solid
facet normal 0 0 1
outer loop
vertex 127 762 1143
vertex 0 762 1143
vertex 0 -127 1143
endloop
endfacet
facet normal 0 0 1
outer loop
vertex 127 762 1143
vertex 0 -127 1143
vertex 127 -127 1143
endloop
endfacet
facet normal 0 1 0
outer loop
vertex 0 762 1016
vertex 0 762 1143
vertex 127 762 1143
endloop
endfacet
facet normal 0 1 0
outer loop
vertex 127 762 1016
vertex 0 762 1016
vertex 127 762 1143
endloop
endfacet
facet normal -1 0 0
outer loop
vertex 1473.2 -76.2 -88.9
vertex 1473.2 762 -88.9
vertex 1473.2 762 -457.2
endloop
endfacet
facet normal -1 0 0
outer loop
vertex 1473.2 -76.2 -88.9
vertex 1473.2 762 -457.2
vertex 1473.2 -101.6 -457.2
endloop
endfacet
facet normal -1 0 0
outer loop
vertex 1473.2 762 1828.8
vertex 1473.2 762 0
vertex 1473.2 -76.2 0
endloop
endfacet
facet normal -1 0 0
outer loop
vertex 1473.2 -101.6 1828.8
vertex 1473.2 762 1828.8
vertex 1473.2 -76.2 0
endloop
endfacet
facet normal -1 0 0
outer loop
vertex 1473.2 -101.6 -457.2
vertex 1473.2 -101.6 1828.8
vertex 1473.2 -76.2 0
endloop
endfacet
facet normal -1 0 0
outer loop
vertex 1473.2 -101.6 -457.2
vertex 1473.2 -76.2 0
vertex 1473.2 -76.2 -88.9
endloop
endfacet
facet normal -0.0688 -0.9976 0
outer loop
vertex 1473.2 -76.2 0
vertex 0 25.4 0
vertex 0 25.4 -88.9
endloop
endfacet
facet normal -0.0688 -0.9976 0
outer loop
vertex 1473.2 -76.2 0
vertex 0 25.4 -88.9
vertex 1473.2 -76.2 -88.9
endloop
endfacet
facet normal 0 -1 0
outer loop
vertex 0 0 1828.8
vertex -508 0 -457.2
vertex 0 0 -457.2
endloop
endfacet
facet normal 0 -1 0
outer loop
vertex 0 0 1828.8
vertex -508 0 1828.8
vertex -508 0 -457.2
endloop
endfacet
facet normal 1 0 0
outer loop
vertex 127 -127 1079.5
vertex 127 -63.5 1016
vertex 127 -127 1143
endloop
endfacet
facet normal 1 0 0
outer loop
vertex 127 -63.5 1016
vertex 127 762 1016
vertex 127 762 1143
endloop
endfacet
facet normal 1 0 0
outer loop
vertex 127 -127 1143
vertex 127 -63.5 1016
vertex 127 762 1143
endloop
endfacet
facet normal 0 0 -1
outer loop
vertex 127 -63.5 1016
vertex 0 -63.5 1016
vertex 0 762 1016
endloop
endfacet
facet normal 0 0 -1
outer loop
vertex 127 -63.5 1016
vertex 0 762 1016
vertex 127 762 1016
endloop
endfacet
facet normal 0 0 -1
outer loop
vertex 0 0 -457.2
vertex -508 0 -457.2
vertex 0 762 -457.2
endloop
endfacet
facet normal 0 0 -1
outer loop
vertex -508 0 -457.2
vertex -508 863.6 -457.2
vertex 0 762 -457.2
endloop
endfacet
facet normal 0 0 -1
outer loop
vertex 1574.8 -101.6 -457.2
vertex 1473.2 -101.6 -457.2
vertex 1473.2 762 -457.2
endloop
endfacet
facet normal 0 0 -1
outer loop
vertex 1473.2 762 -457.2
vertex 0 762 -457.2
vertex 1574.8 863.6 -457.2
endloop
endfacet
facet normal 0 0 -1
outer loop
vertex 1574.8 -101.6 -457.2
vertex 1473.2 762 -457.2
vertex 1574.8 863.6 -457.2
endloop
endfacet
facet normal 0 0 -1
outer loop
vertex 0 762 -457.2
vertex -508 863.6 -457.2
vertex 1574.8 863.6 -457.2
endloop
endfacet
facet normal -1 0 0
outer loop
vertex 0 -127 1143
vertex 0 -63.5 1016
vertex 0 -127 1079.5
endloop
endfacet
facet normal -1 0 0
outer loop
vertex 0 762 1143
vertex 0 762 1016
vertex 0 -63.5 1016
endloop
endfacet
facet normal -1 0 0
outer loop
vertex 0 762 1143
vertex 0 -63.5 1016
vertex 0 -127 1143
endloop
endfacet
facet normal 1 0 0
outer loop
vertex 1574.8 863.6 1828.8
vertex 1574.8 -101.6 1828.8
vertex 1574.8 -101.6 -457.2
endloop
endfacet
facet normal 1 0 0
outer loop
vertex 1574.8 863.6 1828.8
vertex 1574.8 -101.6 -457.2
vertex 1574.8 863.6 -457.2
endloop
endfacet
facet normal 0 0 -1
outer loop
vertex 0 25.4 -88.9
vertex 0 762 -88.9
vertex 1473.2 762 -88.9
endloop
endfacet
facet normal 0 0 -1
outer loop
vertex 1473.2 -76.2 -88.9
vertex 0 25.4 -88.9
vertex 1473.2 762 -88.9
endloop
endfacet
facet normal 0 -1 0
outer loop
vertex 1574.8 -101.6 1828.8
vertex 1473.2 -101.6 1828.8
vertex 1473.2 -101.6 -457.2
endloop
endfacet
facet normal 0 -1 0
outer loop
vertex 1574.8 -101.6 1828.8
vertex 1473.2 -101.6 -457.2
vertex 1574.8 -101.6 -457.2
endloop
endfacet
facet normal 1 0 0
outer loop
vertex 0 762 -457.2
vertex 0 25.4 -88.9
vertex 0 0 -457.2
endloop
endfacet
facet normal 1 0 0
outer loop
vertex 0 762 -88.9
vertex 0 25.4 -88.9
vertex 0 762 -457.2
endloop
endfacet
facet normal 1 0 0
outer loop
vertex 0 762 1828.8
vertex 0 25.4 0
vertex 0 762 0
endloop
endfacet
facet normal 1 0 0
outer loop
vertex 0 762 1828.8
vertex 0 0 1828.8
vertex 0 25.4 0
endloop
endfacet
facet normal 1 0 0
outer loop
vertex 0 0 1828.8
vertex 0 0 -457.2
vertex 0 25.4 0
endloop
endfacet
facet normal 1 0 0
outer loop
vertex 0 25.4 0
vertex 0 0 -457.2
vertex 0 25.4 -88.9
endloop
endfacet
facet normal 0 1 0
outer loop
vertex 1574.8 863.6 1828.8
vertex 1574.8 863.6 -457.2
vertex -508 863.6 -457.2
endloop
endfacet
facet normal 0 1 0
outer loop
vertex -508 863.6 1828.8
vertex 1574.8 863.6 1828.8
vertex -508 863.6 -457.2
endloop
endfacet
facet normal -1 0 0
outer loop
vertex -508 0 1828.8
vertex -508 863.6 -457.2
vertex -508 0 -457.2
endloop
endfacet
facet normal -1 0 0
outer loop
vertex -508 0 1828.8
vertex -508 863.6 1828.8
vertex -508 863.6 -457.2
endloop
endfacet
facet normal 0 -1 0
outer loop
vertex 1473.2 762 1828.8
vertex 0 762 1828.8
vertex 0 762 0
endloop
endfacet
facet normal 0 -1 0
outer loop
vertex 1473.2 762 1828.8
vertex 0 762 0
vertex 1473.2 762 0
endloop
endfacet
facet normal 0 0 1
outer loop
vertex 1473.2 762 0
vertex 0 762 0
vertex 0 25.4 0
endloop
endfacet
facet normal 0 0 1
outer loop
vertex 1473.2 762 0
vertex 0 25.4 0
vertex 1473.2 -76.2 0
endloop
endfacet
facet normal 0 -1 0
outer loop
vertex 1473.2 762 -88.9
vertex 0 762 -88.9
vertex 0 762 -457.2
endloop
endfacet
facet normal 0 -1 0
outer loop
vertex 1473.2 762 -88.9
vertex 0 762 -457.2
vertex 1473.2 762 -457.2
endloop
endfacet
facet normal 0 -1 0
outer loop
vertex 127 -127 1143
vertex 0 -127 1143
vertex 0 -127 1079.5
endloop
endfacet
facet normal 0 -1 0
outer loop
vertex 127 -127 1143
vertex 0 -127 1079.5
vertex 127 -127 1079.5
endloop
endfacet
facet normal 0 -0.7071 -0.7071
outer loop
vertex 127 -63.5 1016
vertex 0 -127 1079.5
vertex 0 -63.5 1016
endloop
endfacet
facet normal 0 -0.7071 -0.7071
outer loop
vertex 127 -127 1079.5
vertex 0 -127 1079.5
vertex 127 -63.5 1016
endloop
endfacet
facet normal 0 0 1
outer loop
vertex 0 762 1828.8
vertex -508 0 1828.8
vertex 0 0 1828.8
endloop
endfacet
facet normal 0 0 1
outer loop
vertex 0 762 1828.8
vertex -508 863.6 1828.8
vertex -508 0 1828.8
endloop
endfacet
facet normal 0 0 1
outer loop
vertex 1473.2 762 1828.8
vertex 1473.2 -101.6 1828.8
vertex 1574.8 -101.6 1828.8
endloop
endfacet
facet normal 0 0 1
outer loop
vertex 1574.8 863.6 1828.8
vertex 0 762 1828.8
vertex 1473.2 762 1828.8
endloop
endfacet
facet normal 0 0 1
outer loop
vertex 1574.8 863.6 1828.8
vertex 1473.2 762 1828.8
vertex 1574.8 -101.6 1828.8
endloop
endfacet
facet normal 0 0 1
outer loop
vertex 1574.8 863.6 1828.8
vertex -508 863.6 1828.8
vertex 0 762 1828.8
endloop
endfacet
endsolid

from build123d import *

# Parameters (mm, degrees)
F1_DEPTH      = 1828.8
F1_DEPTH_BACK = 457.2
F2_DEPTH      = 88.9
F3_W          = 127
F3_H          = 127
F4_DEPTH      = 762
F4_DEPTH_BACK = 127
F5_SIZE       = 63.5


with BuildPart() as f1:
    # F0 (on Top) → F1 (new body, two sides)
    with BuildSketch(Plane.XY) as f1_sk:
        Polygon((-508, 0), (0, 0), (0, 25.4), (0, 762), (1473.2, 762), (1473.2, -76.2), (1473.2, -101.6), (1574.8, -101.6), (1574.8, 863.6), (-508, 863.6), align=None)
    extrude(amount=F1_DEPTH)
    extrude(f1_sk.sketch, amount=-F1_DEPTH_BACK)

    # F0 (on Top) → F2 (join)
    with BuildSketch(Plane.XY):
        Polygon((0, 762), (0, 25.4), (1473.2, -76.2), (1473.2, 762), align=None)
    extrude(amount=-F2_DEPTH)


with BuildPart() as f4:
    # F3 (on face) → F4 (new body, two sides)
    with BuildSketch(Plane.XZ) as f4_sk:
        with Locations((63.5, 1079.5)):
            Rectangle(F3_W, F3_H)
    extrude(amount=-F4_DEPTH)
    extrude(f4_sk.sketch, amount=F4_DEPTH_BACK)

    # F5
    f5_edges = [f4.edges().sort_by_distance(p)[0] for p in [
        (63.5, -127, 1016),
    ]]
    chamfer(f5_edges, length=F5_SIZE)


solid = Compound([f1.part, f4.part])
